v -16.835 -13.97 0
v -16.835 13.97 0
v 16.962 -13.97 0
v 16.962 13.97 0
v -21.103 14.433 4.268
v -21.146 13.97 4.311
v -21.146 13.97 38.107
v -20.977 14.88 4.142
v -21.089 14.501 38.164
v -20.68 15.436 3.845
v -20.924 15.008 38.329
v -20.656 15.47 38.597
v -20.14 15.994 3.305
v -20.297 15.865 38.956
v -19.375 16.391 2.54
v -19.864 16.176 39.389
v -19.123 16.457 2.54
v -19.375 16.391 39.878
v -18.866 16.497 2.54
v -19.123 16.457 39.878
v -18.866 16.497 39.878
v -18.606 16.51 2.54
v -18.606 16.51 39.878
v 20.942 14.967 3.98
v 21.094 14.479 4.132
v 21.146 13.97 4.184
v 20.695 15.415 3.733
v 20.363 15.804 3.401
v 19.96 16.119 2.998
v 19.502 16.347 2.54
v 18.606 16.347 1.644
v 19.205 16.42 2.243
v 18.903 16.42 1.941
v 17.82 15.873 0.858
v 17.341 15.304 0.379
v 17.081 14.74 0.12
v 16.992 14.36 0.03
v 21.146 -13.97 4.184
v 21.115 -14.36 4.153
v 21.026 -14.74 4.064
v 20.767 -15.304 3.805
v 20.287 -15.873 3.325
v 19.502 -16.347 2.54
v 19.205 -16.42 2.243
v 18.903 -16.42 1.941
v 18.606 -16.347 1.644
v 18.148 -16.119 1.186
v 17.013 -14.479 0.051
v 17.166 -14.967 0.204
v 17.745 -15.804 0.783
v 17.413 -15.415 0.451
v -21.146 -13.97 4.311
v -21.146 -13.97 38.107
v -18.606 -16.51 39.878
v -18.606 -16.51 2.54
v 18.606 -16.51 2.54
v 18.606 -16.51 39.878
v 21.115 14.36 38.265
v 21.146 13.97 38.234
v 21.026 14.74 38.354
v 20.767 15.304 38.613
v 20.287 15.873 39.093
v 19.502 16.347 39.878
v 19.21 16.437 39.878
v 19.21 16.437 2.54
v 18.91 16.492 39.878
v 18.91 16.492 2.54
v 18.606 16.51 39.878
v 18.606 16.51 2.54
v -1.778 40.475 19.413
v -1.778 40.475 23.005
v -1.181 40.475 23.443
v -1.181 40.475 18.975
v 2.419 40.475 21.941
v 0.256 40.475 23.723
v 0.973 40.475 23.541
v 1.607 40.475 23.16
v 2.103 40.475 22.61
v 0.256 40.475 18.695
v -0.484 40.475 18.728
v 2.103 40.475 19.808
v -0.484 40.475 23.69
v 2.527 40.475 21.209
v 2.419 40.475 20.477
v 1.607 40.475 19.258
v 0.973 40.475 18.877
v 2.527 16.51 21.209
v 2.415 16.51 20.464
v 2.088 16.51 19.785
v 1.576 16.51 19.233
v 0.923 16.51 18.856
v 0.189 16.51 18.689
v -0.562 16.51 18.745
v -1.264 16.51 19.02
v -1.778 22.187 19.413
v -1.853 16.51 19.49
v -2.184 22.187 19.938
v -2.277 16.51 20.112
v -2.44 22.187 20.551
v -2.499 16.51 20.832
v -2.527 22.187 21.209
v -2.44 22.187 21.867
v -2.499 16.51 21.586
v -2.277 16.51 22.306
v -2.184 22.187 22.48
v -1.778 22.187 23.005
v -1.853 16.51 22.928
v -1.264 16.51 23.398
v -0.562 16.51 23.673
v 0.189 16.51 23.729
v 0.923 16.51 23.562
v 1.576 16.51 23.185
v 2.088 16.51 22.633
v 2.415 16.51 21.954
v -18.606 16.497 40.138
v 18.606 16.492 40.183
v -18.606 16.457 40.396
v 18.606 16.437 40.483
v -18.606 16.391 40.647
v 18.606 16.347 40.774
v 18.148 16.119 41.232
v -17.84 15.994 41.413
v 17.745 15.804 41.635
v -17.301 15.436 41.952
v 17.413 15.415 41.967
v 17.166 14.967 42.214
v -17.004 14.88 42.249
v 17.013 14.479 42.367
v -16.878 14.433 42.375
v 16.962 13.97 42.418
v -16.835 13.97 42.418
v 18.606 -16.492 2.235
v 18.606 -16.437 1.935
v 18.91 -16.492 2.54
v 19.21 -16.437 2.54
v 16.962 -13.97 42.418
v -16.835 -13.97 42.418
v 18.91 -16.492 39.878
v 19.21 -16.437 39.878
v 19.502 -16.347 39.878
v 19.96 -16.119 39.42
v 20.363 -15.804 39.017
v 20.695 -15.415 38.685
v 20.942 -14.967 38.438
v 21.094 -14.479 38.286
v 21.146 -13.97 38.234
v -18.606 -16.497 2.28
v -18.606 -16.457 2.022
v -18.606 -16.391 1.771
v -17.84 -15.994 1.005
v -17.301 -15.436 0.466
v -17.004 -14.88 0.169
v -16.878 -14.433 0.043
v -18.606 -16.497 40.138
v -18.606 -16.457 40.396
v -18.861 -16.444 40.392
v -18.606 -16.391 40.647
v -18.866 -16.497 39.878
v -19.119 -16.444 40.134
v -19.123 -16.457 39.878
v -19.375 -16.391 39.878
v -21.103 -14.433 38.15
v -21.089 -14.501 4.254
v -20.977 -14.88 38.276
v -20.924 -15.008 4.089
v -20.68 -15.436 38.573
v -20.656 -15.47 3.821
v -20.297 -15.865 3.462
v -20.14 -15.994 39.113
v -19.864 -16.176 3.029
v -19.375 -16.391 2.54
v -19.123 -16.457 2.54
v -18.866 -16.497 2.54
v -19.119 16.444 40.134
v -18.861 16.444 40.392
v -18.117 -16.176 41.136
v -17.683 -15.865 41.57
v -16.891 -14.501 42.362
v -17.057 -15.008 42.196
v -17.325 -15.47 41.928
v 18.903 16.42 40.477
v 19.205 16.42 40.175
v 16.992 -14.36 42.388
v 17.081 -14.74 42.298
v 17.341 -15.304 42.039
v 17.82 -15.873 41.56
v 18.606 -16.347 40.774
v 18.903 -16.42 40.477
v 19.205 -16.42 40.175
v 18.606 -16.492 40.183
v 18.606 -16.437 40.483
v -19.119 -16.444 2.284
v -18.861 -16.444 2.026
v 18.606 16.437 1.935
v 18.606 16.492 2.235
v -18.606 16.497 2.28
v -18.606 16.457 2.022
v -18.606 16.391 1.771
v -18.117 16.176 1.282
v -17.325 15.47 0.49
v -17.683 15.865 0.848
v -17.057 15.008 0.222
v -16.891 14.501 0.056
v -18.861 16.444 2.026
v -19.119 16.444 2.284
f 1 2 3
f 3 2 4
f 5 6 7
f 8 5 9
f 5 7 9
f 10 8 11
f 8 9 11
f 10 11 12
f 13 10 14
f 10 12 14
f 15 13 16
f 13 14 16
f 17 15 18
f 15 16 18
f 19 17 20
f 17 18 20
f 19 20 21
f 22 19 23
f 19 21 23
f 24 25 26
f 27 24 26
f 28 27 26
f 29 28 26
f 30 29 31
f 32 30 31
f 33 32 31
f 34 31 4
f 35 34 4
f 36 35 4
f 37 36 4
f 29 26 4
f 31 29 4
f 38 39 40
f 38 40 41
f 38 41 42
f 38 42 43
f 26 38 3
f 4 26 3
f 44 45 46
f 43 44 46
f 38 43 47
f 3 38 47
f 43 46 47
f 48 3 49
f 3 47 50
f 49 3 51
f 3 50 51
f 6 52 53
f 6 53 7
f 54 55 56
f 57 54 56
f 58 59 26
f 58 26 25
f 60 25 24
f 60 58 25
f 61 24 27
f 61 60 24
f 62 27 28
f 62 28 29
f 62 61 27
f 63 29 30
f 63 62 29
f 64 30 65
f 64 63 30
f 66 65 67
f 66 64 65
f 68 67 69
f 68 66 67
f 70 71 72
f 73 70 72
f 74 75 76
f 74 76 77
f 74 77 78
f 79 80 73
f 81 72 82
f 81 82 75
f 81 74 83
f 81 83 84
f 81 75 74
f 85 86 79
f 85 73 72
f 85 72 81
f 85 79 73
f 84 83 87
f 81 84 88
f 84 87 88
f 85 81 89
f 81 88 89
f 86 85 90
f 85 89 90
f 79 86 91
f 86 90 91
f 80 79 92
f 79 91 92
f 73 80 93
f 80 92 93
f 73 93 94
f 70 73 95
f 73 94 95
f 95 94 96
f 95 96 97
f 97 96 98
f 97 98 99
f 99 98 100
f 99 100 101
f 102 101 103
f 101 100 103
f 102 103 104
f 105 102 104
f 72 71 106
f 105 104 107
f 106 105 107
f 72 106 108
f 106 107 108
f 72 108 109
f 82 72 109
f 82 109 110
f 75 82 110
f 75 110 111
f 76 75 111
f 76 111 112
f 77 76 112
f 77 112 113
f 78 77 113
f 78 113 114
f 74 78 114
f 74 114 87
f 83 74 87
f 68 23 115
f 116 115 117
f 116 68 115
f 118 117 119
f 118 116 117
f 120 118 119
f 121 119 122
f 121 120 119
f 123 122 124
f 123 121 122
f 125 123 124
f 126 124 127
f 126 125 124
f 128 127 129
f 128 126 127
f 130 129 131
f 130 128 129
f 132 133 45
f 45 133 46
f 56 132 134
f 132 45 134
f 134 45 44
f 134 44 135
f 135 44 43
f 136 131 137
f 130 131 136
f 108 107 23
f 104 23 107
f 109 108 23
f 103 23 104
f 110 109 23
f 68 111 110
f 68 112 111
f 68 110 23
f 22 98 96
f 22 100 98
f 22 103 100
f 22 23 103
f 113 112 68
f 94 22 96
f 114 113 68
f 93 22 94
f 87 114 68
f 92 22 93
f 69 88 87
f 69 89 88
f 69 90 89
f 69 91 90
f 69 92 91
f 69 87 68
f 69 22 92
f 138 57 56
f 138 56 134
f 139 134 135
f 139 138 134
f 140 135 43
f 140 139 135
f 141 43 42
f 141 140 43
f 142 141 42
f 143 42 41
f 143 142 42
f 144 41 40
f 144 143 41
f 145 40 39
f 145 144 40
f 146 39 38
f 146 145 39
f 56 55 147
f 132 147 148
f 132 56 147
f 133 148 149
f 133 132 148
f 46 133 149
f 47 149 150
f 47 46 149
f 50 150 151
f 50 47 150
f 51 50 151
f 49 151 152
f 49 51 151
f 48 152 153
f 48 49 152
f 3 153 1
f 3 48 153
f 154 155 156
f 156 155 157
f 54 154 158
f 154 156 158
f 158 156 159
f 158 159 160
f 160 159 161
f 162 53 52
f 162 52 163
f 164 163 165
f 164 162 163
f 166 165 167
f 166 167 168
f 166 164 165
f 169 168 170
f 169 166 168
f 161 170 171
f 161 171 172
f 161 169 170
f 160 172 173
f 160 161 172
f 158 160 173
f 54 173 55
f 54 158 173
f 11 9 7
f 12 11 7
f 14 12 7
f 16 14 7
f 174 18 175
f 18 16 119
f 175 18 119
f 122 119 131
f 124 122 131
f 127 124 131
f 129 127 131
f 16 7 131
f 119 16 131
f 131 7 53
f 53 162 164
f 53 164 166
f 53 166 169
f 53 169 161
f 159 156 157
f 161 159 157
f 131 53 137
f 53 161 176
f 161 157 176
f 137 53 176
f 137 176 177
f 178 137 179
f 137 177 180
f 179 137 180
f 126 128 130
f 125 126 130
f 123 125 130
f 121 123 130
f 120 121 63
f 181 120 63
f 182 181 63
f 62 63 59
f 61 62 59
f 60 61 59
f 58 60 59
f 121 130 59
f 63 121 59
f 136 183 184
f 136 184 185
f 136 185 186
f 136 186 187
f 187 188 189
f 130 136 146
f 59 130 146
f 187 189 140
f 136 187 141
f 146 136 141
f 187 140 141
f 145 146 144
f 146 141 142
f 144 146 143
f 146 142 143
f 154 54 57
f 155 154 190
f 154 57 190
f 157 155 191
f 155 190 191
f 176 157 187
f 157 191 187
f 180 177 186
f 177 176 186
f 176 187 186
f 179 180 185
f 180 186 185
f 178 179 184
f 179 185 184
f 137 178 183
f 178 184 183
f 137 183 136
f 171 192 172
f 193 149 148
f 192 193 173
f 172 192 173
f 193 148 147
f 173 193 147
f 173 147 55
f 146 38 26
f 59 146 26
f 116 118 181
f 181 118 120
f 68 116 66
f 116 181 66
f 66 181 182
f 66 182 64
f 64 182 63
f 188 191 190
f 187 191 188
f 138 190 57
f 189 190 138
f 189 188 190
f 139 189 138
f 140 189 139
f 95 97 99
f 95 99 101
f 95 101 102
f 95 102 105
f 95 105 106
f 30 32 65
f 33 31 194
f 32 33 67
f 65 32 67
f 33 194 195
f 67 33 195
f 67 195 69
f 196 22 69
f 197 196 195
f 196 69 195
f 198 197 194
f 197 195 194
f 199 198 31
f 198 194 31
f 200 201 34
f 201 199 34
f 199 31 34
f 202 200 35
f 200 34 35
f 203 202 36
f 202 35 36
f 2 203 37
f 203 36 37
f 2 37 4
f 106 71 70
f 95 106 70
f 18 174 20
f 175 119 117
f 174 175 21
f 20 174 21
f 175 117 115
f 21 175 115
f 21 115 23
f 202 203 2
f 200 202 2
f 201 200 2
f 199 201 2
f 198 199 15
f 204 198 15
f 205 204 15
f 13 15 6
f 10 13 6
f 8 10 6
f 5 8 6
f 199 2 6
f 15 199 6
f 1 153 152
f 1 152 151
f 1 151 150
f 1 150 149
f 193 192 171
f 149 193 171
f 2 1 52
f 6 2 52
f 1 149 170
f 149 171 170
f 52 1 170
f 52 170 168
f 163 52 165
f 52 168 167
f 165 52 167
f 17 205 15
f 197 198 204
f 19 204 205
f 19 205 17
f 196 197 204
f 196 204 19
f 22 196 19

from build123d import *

# Parameters (mm, degrees)
SKETCH1_W           = 42.291
SKETCH1_H           = 33.02
BOSS_EXTRUDE1_DEPTH = 42.418
FILLET1_R           = 2.54
SKETCH2_R           = 2.5273
BOSS_EXTRUDE2_DEPTH = 23.9649
CUT_EXTRUDE2_DEPTH  = 18.288
CUT_EXTRUDE3_REACH  = 58.985


with BuildPart() as part:
    # Sketch1 → Boss-Extrude1 (new body)
    with BuildSketch(Plane.XY):
        Rectangle(SKETCH1_W, SKETCH1_H)
    extrude(amount=BOSS_EXTRUDE1_DEPTH)

    # Fillet1
    fillet1_edges = [part.edges().sort_by_distance(p)[0] for p in [
        (21.1455, 0, 42.418),
        (0, 16.51, 42.418),
        (-21.1455, 0, 42.418),
        (0, 16.51, 0),
        (21.1455, 0, 0),
        (0, -16.51, 0),
        (-21.1455, 0, 0),
        (0, -16.51, 42.418),
        (-21.1455, 16.51, 21.209),
        (21.1455, 16.51, 21.209),
        (21.1455, -16.51, 21.209),
        (-21.1455, -16.51, 21.209),
    ]]
    fillet(fillet1_edges, radius=FILLET1_R)

    # Sketch2 → Boss-Extrude2 (add)
    with BuildSketch(Plane(origin=(0, 16.51, 0), x_dir=(1, 0, 0), z_dir=(0, 1, 0))):
        with Locations((0, -21.209)):
            Circle(SKETCH2_R)
    extrude(amount=BOSS_EXTRUDE2_DEPTH)

    # Sketch4 → Cut-Extrude2 (cut)
    with BuildSketch(Plane(origin=(0, 40.4749, 0), x_dir=(1, 0, 0), z_dir=(0, 1, 0))):
        with BuildLine():
            Line((-1.778, -23.005096125), (-1.778, -19.412903875))
            ThreePointArc((-1.778, -19.412903875), (-2.5273, -21.209), (-1.778, -23.005096125))
        make_face()
    extrude(amount=-CUT_EXTRUDE2_DEPTH, mode=Mode.SUBTRACT)

    # Sketch5 → Cut-Extrude3 (cut, up to next)
    with BuildSketch(Plane.XZ.offset(16.51), mode=Mode.PRIVATE) as cut_extrude3_sk1:
        Polygon((-21.1455, 42.418), (-21.1455, 38.107477062), (-16.834977062, 42.418), align=None)
    cut_extrude3_tool1 = extrude(cut_extrude3_sk1.sketch, amount=-CUT_EXTRUDE3_REACH, mode=Mode.PRIVATE) & part.part
    add(cut_extrude3_tool1.solids().sort_by_distance((-19.708659, -16.51, 40.981159))[0], mode=Mode.SUBTRACT)
    # Sketch5 → Cut-Extrude3 (cut, up to next)
    with BuildSketch(Plane.XZ.offset(16.51), mode=Mode.PRIVATE) as cut_extrude3_sk2:
        Polygon((16.961977062, 42.418), (21.2725, 38.107477062), (21.2725, 42.418), align=None)
    cut_extrude3_tool2 = extrude(cut_extrude3_sk2.sketch, amount=-CUT_EXTRUDE3_REACH, mode=Mode.PRIVATE) & part.part
    add(cut_extrude3_tool2.solids().sort_by_distance((19.835659, -16.51, 40.981159))[0], mode=Mode.SUBTRACT)
    # Sketch5 → Cut-Extrude3 (cut, up to next)
    with BuildSketch(Plane.XZ.offset(16.51), mode=Mode.PRIVATE) as cut_extrude3_sk3:
        Polygon((-21.1455, 0), (-16.834977062, 0), (-21.1455, 4.310522938), align=None)
    cut_extrude3_tool3 = extrude(cut_extrude3_sk3.sketch, amount=-CUT_EXTRUDE3_REACH, mode=Mode.PRIVATE) & part.part
    add(cut_extrude3_tool3.solids().sort_by_distance((-19.708659, -16.51, 1.436841))[0], mode=Mode.SUBTRACT)
    # Sketch5 → Cut-Extrude3 (cut, up to next)
    with BuildSketch(Plane.XZ.offset(16.51), mode=Mode.PRIVATE) as cut_extrude3_sk4:
        Polygon((21.2725, 0), (21.2725, 4.310522938), (16.961977062, 0), align=None)
    cut_extrude3_tool4 = extrude(cut_extrude3_sk4.sketch, amount=-CUT_EXTRUDE3_REACH, mode=Mode.PRIVATE) & part.part
    add(cut_extrude3_tool4.solids().sort_by_distance((19.835659, -16.51, 1.436841))[0], mode=Mode.SUBTRACT)


solid = part.part
